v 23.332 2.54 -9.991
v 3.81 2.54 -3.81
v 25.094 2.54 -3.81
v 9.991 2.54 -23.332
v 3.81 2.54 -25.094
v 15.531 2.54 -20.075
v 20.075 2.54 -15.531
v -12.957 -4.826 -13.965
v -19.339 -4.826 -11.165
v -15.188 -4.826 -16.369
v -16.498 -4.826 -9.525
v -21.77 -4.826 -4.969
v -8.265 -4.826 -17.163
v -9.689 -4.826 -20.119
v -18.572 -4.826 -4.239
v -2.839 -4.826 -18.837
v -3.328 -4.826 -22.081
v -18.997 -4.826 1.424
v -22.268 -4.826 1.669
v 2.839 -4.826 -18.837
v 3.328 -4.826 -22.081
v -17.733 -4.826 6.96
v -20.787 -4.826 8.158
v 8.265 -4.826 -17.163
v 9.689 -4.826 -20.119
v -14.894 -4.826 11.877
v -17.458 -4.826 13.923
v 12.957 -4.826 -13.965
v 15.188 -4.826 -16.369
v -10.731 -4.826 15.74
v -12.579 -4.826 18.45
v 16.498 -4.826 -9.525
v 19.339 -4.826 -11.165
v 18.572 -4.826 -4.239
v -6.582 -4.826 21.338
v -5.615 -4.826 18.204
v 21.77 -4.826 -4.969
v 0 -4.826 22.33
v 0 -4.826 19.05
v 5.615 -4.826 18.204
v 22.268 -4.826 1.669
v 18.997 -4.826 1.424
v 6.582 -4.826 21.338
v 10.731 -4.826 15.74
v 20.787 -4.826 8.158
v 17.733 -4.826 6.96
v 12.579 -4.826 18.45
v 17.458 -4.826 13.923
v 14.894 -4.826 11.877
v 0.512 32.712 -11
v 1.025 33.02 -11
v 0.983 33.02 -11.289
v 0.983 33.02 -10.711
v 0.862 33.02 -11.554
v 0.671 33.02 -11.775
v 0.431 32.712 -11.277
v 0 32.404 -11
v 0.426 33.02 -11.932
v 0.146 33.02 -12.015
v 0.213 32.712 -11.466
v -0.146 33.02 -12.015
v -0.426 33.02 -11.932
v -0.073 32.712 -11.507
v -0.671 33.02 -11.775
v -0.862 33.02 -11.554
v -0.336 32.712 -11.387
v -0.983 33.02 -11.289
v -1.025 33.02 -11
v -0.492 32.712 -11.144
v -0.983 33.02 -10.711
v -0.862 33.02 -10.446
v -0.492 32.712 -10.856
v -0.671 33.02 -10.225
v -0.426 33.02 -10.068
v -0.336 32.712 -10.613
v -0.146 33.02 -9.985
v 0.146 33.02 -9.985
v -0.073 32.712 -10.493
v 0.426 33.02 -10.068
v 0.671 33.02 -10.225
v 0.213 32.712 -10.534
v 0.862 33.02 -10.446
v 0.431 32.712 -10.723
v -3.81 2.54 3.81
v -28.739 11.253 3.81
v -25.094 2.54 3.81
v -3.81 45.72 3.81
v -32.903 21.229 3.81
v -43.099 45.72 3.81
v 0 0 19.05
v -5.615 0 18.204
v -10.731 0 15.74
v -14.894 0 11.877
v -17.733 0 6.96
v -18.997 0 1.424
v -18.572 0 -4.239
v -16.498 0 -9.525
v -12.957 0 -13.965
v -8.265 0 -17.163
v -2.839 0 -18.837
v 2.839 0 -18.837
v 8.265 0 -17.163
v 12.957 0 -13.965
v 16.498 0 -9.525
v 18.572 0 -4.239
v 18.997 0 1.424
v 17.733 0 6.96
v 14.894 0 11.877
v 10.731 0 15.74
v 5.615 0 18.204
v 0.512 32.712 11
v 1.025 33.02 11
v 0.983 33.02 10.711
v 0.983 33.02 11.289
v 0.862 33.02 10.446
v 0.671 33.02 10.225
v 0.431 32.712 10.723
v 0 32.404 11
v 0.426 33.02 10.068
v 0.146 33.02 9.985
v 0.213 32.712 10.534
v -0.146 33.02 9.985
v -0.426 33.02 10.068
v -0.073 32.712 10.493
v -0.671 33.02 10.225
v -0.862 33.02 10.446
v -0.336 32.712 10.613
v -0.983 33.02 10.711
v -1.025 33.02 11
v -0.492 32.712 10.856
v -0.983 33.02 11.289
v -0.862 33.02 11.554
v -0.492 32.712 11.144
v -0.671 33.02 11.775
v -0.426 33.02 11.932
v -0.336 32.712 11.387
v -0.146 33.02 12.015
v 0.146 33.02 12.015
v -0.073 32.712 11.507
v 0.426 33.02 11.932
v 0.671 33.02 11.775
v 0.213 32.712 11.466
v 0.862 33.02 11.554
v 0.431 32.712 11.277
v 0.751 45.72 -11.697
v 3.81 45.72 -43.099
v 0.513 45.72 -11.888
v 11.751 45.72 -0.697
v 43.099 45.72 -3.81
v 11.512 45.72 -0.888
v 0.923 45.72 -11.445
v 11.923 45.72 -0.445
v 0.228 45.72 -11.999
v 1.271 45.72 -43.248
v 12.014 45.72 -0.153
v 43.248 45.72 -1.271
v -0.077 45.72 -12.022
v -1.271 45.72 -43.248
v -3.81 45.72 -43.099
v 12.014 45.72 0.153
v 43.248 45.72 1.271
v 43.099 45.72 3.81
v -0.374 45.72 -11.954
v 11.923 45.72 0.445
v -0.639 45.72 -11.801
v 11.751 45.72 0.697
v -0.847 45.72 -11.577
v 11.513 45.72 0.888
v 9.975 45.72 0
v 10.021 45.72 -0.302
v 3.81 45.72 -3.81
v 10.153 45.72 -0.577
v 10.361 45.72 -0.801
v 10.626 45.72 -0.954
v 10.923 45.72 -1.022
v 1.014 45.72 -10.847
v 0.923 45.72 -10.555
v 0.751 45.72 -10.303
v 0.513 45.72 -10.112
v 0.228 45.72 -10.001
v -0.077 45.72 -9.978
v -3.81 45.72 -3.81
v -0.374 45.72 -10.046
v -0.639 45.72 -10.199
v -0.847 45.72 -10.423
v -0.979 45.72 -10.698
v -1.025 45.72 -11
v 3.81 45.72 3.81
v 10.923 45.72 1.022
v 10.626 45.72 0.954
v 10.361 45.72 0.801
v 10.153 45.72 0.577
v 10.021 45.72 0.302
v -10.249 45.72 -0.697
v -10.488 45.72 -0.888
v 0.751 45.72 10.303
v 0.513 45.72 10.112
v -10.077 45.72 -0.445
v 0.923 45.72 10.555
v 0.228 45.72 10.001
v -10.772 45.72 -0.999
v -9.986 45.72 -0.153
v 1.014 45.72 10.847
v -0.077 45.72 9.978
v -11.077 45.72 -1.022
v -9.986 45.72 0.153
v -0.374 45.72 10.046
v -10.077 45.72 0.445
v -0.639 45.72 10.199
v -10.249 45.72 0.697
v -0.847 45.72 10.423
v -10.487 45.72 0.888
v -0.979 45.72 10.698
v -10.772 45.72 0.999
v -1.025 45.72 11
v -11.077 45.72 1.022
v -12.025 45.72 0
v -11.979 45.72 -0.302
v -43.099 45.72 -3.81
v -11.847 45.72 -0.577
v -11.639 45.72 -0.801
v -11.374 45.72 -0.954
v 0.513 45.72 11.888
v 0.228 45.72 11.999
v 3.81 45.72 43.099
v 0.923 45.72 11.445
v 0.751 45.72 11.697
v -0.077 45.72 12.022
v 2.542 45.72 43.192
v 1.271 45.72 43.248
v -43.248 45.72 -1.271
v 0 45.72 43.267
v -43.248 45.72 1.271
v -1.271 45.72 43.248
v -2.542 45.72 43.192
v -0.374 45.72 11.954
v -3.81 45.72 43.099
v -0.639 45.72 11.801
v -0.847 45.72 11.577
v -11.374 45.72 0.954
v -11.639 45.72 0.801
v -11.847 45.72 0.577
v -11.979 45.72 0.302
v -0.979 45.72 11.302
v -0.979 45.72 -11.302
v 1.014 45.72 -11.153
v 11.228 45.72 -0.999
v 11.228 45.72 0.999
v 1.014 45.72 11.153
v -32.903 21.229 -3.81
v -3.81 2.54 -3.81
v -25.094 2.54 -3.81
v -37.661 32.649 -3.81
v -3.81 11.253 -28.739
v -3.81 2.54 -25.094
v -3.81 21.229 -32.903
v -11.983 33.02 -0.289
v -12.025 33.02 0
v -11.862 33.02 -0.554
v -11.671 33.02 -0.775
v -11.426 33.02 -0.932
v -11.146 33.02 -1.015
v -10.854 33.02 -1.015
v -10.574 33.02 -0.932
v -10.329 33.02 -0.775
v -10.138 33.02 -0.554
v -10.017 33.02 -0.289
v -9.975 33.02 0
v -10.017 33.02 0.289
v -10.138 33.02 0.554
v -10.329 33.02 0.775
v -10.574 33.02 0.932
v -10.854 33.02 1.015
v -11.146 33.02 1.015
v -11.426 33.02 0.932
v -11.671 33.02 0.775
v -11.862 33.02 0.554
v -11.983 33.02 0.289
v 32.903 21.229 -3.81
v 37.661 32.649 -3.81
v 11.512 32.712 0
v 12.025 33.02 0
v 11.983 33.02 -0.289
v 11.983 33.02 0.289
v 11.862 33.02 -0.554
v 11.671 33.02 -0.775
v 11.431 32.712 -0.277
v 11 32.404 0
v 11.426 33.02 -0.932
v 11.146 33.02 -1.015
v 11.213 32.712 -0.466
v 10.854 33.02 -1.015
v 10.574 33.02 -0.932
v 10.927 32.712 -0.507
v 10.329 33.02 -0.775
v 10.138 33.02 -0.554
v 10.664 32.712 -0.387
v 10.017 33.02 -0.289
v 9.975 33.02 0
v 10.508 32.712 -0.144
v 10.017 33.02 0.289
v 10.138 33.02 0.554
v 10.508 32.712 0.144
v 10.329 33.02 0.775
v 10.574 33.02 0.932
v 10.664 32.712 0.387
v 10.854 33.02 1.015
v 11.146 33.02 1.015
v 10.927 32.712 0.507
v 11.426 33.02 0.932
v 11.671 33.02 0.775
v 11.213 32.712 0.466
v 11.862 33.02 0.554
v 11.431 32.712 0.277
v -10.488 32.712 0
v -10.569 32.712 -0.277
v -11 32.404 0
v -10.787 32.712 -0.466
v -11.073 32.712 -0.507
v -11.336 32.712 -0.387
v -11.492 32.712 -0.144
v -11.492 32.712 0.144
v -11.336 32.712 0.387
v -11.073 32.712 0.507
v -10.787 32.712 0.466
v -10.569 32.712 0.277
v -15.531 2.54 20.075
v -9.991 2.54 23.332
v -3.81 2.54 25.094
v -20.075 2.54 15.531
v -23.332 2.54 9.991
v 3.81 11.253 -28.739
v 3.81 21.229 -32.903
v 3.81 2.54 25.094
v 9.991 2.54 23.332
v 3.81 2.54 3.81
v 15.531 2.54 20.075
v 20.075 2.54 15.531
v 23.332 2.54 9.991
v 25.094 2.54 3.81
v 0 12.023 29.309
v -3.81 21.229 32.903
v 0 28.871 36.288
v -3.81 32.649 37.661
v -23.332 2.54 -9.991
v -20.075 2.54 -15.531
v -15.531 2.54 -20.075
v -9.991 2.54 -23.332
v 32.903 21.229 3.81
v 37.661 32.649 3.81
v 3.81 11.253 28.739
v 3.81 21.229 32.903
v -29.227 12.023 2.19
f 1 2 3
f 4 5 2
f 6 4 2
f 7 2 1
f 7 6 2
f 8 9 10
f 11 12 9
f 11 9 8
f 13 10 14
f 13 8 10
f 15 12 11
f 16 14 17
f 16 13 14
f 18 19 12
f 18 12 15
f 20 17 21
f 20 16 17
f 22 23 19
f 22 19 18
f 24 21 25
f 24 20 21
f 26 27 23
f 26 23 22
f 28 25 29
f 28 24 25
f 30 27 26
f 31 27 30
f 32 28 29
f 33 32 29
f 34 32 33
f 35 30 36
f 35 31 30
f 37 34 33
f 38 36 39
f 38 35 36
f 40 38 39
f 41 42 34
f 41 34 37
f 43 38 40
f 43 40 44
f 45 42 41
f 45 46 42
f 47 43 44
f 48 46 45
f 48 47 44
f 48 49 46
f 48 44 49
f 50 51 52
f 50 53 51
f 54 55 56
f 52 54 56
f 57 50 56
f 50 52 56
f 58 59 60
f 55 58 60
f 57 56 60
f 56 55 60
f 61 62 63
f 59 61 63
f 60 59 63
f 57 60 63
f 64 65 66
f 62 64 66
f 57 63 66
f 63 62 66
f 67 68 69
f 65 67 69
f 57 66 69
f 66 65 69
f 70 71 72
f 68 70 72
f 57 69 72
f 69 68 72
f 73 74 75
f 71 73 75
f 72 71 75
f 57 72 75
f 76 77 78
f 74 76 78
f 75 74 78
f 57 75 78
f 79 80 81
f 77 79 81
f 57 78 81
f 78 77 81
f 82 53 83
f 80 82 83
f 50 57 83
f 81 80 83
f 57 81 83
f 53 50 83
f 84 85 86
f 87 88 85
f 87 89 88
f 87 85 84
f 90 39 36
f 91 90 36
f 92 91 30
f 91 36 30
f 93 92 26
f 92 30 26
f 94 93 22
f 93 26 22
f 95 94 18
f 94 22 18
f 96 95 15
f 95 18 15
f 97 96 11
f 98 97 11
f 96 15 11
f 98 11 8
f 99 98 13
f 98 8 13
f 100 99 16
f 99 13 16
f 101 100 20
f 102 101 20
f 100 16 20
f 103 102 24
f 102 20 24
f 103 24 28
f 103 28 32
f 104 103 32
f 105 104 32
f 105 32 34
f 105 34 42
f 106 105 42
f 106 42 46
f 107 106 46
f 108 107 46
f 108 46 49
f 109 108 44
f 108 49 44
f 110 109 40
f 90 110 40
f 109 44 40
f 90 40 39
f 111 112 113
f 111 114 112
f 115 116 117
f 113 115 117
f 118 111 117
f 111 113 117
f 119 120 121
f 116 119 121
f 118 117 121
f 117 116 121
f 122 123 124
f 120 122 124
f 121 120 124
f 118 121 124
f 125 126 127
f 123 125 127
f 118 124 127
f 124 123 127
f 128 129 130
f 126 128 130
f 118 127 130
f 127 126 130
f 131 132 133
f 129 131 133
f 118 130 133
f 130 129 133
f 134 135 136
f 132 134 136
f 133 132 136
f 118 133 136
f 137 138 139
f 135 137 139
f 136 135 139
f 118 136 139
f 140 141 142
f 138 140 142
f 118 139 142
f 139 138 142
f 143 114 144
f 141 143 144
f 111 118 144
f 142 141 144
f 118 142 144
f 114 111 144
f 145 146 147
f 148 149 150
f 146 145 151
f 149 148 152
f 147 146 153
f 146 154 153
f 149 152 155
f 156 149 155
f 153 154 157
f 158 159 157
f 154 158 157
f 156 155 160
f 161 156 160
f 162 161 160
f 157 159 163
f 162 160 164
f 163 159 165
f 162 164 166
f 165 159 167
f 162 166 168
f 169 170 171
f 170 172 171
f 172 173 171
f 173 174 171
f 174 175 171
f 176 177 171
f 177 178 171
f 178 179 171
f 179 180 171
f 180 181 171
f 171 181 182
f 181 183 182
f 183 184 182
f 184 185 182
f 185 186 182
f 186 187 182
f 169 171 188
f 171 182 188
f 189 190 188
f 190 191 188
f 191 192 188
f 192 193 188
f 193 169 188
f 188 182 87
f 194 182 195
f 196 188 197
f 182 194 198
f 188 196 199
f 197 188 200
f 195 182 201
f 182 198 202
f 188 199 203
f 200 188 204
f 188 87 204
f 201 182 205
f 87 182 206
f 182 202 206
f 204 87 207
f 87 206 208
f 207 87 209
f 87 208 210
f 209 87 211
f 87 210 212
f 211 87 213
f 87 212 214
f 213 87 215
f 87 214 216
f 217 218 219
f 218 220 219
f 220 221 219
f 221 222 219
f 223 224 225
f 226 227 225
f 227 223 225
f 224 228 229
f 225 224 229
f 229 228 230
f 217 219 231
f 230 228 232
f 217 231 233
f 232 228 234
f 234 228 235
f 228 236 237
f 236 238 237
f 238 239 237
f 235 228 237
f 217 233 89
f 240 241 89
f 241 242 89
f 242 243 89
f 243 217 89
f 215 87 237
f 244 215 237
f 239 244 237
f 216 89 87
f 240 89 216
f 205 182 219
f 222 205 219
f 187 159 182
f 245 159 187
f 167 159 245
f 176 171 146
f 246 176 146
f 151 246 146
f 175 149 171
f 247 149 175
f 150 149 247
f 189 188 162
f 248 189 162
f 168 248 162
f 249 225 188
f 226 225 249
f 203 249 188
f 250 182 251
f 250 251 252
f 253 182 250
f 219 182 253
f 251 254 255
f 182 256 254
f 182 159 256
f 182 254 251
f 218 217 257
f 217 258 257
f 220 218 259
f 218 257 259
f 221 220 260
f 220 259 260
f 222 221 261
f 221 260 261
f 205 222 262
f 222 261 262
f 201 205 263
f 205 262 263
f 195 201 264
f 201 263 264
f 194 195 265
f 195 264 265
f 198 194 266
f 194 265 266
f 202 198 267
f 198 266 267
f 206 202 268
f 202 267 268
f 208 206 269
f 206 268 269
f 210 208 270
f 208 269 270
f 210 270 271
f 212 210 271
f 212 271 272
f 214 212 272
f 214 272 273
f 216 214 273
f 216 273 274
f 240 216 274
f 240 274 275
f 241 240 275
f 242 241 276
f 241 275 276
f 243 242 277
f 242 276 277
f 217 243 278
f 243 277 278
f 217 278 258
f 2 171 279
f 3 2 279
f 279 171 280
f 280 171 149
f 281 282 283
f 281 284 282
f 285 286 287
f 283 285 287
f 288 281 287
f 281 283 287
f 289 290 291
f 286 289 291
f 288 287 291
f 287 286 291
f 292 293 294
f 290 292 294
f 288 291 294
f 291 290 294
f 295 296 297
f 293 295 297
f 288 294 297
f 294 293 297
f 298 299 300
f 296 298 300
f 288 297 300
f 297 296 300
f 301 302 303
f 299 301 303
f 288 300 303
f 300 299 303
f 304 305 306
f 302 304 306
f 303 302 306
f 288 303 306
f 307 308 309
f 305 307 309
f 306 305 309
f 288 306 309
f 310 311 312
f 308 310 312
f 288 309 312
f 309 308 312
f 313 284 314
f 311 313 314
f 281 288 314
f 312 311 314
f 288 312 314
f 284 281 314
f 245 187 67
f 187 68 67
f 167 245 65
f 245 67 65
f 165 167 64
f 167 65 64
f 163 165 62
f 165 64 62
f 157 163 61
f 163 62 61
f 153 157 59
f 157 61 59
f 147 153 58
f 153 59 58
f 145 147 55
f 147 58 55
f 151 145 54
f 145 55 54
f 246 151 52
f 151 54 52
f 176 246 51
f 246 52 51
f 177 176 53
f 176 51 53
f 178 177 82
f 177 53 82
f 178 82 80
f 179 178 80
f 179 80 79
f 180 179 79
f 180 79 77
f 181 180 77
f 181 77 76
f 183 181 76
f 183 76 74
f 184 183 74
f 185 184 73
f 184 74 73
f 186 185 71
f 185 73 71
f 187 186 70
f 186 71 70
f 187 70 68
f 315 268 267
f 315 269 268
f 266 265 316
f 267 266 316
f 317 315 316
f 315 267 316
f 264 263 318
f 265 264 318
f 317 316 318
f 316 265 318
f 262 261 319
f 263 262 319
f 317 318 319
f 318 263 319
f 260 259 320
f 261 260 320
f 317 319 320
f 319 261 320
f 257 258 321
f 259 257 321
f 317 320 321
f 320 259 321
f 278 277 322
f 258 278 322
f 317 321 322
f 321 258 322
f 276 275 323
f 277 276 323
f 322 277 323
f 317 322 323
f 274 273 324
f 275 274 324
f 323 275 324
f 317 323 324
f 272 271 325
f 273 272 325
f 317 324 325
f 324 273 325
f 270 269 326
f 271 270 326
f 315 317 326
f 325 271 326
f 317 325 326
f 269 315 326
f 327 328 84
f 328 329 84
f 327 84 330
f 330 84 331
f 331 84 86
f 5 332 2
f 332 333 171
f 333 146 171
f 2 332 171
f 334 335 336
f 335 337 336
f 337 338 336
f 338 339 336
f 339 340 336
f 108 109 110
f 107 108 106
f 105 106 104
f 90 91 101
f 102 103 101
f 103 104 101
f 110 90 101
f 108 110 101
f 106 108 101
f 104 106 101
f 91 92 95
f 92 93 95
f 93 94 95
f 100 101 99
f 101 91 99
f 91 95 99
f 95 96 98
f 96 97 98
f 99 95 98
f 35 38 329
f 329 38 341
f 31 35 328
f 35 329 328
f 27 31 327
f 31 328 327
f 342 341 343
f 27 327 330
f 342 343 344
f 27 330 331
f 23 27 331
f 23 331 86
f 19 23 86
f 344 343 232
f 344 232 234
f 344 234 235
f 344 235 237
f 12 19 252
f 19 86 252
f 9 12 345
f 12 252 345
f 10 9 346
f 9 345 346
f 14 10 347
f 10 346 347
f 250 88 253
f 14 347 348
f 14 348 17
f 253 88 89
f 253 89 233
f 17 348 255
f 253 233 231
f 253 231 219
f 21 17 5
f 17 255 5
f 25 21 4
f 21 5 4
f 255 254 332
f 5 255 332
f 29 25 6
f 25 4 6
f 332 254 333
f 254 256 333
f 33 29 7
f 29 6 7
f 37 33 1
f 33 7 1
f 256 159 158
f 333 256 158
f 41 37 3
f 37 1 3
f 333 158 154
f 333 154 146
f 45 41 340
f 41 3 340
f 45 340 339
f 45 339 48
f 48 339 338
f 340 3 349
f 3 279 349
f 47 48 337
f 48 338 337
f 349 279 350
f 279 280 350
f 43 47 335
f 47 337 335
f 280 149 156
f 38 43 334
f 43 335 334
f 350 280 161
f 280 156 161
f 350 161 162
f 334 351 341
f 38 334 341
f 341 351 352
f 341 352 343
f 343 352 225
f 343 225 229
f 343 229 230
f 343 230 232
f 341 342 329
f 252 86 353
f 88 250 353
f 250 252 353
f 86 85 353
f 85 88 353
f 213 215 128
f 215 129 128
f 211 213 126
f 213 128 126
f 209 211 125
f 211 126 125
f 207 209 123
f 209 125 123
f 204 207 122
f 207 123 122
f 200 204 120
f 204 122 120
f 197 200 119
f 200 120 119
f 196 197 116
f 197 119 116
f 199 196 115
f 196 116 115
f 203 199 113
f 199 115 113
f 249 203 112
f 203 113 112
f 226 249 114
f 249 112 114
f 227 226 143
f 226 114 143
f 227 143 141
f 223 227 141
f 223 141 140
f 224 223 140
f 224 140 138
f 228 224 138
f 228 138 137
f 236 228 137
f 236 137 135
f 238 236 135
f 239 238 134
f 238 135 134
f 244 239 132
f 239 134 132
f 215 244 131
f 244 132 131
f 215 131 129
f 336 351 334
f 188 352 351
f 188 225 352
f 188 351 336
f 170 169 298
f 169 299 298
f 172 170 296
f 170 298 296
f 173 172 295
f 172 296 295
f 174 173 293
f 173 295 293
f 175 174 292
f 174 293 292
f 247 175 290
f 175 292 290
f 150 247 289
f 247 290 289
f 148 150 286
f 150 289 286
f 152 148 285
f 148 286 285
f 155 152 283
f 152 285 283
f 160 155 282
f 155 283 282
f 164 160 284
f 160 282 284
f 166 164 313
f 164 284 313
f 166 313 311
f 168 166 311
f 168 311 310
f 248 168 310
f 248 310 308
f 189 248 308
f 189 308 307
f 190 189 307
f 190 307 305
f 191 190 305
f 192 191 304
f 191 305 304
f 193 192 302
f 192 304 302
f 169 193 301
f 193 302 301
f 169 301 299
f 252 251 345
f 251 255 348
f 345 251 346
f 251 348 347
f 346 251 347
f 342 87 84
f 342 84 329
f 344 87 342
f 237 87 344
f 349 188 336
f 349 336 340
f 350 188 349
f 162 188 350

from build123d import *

# Parameters (mm, degrees)
M2_5X0_45_TAPPED_HOLE1_D     = 2.05
M2_5X0_45_TAPPED_HOLE1_DEPTH = 12.7
M2_5X0_45_TAPPED_HOLE1_TIP   = 0.615882135
CROSS_WEIGHT_REDUCTION_DEPTH = 43.18
SKETCH5_R                    = 33.817028943
CUT_EXTRUDE1_DEPTH           = 0.254


with BuildPart() as part:
    # Sketch1 → Revolve1 (revolve)
    with BuildSketch(Plane(origin=(0, 0, 0), x_dir=(0, 0, -1), z_dir=(1, 0, 0))):
        Polygon((0, 0), (-19.05, 0), (-19.05, -5.08), (-22.225, -5.08), (-43.267048969, 45.72), (0, 45.72), align=None)
    revolve(axis=Axis((0, 0, 0), (0, -1, 0)))

    # M2.5x0.45 Tapped Hole1
    with Locations(Plane(origin=(0, 45.72, 0), x_dir=(1, 0, 0), z_dir=(0, 1, 0))):
        with Locations((0, 11), (11, 0), (0, -11), (-11, 0)):
            Hole(M2_5X0_45_TAPPED_HOLE1_D / 2, depth=M2_5X0_45_TAPPED_HOLE1_DEPTH)
            with Locations((0, 0, -(M2_5X0_45_TAPPED_HOLE1_DEPTH + M2_5X0_45_TAPPED_HOLE1_TIP / 2))):  # 118° drill point
                Cone(0, M2_5X0_45_TAPPED_HOLE1_D / 2, M2_5X0_45_TAPPED_HOLE1_TIP, mode=Mode.SUBTRACT)

    # Sketch2 → cross_weight_reduction (cut)
    with BuildSketch(Plane(origin=(0, 45.72, 0), x_dir=(1, 0, 0), z_dir=(0, 1, 0))):
        with BuildLine():
            Line((-3.81, -3.81), (-3.81, -43.098972452))
            ThreePointArc((-3.81, -43.098972452), (-30.594423728, -30.594423728), (-43.098972452, -3.81))
            Line((-43.098972452, -3.81), (-3.81, -3.81))
        make_face()
        with BuildLine():
            Line((-3.81, 43.098972452), (-3.81, 3.81))
            Line((-3.81, 3.81), (-43.098972452, 3.81))
            ThreePointArc((-43.098972452, 3.81), (-30.594423728, 30.594423728), (-3.81, 43.098972452))
        make_face()
        with BuildLine():
            Line((3.81, -43.098972452), (3.81, -3.81))
            Line((3.81, -3.81), (43.098972452, -3.81))
            ThreePointArc((43.098972452, -3.81), (30.594423728, -30.594423728), (3.81, -43.098972452))
        make_face()
        with BuildLine():
            Line((3.81, 3.81), (43.098972452, 3.81))
            ThreePointArc((43.098972452, 3.81), (30.594423728, 30.594423728), (3.81, 43.098972452))
            Line((3.81, 43.098972452), (3.81, 3.81))
        make_face()
    extrude(amount=-CROSS_WEIGHT_REDUCTION_DEPTH, mode=Mode.SUBTRACT)

    # Sketch5 → Cut-Extrude1 (cut)
    with BuildSketch(Plane.XZ.offset(5.08)):
        Circle(SKETCH5_R)
    extrude(amount=-CUT_EXTRUDE1_DEPTH, mode=Mode.SUBTRACT)


solid = part.part
